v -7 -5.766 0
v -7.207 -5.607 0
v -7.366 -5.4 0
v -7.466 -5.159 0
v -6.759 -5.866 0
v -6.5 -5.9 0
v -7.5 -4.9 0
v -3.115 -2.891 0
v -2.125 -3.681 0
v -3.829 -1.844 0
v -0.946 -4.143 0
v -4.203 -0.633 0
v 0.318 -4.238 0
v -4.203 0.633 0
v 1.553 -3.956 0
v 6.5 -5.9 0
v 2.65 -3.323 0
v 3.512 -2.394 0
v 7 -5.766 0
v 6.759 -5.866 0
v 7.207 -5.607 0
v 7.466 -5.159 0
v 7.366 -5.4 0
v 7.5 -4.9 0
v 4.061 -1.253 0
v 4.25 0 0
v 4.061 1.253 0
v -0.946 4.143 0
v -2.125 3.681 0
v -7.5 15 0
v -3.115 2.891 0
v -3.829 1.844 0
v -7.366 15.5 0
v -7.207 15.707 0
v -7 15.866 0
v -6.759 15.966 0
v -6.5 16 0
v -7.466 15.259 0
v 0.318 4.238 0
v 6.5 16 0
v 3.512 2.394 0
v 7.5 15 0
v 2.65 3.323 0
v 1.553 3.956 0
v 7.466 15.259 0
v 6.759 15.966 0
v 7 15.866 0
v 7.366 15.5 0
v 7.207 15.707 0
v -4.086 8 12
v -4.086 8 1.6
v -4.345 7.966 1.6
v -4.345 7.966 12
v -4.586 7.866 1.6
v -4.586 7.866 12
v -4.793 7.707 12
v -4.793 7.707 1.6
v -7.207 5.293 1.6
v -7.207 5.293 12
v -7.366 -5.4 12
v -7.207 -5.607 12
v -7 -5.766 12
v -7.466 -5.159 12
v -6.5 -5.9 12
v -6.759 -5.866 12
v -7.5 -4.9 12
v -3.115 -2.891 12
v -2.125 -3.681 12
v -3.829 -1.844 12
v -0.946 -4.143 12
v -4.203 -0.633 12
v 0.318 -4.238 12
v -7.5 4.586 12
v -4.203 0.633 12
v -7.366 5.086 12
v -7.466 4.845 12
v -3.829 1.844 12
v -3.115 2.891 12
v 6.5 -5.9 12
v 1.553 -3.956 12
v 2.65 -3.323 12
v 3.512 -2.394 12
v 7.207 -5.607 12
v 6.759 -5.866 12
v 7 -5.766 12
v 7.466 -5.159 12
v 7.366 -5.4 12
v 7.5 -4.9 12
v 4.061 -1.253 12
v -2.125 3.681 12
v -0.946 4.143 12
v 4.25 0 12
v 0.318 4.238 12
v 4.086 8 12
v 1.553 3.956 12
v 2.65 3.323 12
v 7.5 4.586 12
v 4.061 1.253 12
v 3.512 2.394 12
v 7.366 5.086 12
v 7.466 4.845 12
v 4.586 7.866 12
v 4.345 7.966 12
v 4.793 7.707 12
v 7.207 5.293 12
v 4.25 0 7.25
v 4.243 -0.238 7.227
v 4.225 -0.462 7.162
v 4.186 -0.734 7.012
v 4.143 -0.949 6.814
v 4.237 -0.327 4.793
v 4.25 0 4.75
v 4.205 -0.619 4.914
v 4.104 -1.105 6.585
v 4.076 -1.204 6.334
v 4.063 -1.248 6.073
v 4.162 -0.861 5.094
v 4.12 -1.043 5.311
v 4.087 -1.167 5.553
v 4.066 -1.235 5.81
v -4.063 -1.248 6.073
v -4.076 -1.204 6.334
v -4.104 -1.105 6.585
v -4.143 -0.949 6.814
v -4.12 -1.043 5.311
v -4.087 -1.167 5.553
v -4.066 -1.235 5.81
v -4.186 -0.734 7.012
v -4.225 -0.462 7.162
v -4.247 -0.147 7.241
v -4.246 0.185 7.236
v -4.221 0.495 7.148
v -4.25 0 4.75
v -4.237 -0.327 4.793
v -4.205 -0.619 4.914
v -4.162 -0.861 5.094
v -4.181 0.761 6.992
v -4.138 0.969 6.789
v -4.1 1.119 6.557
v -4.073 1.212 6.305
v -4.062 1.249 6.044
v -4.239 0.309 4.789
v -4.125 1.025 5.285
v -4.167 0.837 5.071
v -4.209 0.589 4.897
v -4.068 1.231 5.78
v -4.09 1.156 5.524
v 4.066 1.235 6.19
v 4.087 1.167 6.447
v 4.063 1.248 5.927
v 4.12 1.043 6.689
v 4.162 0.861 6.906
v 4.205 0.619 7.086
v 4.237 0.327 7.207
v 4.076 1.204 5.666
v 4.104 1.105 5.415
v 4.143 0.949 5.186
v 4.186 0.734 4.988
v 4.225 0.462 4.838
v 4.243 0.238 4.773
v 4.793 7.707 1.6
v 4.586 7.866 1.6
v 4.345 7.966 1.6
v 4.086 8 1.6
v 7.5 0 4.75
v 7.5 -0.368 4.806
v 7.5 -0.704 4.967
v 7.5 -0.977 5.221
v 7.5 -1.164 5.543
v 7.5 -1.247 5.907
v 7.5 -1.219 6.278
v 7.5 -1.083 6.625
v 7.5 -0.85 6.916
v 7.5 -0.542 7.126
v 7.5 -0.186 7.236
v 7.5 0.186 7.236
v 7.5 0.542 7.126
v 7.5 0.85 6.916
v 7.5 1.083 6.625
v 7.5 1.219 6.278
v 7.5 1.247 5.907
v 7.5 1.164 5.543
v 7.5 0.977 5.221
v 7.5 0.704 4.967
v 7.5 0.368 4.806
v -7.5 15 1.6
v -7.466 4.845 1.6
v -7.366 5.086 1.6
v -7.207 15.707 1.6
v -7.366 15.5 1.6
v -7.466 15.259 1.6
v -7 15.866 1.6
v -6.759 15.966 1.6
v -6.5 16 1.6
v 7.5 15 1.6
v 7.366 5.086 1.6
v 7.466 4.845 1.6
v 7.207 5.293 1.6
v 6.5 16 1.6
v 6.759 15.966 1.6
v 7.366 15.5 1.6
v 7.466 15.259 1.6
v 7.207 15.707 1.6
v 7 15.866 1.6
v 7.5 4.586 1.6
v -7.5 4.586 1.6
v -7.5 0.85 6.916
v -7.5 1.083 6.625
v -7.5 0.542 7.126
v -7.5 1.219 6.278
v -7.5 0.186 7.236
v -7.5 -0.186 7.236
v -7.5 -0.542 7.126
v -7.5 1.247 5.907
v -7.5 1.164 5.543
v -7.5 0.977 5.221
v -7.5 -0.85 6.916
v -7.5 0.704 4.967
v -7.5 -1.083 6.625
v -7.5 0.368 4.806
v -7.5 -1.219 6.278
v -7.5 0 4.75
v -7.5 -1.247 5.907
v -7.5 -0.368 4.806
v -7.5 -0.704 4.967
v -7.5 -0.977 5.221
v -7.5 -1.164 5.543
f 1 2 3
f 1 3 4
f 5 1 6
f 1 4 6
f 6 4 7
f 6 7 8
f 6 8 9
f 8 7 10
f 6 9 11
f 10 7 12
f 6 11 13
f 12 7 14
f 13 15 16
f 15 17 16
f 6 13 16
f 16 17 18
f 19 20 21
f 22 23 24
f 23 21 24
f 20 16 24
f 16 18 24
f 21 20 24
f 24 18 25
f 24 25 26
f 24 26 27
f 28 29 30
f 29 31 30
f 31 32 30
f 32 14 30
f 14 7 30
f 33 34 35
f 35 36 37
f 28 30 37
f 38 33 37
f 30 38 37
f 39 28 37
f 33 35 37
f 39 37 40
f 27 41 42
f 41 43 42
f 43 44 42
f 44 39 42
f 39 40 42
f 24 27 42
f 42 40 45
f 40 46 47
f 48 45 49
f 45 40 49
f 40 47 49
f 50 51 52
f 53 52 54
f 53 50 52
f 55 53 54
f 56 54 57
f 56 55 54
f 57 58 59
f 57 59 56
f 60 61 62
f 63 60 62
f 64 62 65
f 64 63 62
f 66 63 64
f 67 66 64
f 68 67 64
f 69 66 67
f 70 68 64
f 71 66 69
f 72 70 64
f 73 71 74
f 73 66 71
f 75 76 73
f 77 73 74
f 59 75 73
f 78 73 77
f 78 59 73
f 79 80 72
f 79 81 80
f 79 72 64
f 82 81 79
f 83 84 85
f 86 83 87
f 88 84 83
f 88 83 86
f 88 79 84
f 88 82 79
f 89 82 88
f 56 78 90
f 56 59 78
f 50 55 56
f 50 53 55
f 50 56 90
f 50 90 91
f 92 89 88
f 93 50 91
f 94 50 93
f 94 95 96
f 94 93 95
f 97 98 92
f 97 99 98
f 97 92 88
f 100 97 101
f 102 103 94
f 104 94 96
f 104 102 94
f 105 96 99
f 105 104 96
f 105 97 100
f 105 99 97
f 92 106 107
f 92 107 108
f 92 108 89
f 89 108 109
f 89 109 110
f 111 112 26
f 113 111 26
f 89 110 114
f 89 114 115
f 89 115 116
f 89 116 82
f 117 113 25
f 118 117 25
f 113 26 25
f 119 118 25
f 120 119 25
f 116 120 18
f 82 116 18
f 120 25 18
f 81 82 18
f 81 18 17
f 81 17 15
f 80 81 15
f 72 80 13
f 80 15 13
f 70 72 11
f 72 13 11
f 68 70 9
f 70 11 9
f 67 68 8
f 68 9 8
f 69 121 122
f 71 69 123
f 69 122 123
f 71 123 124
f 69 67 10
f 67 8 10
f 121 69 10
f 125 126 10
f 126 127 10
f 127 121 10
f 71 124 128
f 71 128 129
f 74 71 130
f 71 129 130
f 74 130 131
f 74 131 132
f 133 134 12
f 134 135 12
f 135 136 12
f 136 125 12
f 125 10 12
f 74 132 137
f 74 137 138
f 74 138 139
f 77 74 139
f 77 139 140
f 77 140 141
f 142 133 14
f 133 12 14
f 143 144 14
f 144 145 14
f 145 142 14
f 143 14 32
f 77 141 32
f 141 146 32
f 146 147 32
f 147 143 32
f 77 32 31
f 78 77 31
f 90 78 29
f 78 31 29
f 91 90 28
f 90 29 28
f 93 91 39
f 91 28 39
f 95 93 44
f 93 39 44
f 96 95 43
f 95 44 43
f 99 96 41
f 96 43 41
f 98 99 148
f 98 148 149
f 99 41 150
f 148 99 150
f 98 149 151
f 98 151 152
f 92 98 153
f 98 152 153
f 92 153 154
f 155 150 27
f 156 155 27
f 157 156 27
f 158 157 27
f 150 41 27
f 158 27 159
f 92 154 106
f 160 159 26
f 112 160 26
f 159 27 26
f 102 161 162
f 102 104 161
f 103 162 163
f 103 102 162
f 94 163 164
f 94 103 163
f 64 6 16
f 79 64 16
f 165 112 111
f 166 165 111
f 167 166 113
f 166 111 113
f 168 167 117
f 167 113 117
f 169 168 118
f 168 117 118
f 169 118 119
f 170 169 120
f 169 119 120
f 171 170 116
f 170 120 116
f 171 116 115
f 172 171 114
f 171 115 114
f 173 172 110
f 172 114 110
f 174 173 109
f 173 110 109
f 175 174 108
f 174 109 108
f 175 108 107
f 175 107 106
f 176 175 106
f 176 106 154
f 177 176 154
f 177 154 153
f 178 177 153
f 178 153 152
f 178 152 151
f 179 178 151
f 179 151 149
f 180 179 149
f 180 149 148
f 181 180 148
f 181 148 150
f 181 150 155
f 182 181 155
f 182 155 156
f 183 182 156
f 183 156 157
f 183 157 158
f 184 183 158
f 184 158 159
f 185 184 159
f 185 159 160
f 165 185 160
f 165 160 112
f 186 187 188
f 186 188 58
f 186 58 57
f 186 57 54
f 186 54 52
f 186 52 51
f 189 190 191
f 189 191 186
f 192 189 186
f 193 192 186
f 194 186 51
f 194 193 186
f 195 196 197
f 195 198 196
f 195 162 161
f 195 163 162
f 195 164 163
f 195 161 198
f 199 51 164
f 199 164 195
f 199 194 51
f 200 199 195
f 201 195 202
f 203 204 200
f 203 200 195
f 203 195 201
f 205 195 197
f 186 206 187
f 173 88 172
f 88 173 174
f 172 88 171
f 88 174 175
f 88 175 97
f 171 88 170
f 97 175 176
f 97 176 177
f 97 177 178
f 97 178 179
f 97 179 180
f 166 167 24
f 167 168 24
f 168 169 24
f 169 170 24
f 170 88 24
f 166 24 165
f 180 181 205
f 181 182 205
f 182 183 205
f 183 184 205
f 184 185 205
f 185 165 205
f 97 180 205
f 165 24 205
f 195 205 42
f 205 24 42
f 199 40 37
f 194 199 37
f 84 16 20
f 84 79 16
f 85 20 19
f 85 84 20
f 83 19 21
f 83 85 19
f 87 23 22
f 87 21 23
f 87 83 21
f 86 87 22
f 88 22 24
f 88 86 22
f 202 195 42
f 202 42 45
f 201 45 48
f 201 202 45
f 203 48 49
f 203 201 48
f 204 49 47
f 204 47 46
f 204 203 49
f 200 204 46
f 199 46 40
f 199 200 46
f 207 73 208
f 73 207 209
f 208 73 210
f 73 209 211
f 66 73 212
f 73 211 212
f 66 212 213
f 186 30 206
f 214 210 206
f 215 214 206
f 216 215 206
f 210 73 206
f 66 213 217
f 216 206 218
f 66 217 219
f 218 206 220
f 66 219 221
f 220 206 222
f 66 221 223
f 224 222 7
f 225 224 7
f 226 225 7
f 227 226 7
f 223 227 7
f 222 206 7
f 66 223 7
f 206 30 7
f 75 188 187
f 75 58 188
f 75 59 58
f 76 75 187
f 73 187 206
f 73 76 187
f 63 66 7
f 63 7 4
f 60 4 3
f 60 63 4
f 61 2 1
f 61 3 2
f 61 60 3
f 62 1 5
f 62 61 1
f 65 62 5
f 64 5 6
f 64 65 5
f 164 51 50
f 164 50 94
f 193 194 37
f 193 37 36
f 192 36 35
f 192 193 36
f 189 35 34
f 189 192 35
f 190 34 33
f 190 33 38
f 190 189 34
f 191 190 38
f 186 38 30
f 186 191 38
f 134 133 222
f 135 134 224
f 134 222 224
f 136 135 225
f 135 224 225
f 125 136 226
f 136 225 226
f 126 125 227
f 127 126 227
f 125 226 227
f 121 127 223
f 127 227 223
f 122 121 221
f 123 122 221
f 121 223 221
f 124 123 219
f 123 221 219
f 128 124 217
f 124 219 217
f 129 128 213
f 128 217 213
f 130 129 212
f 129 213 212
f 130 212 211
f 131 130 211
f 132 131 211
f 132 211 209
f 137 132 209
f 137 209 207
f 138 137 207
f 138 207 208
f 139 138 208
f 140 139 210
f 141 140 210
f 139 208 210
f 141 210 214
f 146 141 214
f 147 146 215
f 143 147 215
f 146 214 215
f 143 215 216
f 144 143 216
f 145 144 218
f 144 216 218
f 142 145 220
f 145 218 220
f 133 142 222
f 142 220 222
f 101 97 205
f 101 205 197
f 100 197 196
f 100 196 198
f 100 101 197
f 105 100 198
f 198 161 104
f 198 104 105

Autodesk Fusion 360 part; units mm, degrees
sketch "スケッチ1" plane through (0, 0, 0) normal (0, 0, 1) x (1, 0, 0)
  line L0 (7.5, 16) -> (-7.5, 16)
  line L1 (-7.5, 16) -> (-7.5, -5.9)
  line L2 (-7.5, -5.9) -> (7.5, -5.9)
  line L3 (7.5, -5.9) -> (7.5, 16)
  line L4 (7.5, 16) -> (-7.5, -5.9) construction
  line L5 (-7.5, 16) -> (7.5, -5.9) construction
  circle A0 centre (0, 0) radius 4.25
  line L6 (-7.5, 5) -> (-4.5, 8)
  line L7 (-4.5, 8) -> (4.5, 8)
  line L8 (4.5, 8) -> (7.5, 5)
  point P0 (0, 5.05)
  dimension "d1" = 15
  dimension "d2" = 21.9
  dimension "d3" = 8.5
  dimension "d4" = 5.9
  dimension "d5" = 13.9
  dimension "d6" = 45
  dimension "d7" = 45
  dimension "d8" = 3
  dimension "d9" = 3
extrude "押し出し1" add sketch "スケッチ1" along normal blind 12 contours L1 L2 L3 L6 L7 L8
extrude "押し出し2" add sketch "スケッチ1" along normal blind 1.6 contours L0 L1 L3 L6 L7 L8
hole "穴1" at (7.5, 0, 6) direction (-1, 0, 0) diameter 2.5 depth 16 tip angle 118
fillet "フィレット1" radius 1 8 edges at (-7.5, -5.9, 6) (7.5, -5.9, 6) (7.5, 5, 6.8) (4.5, 8, 6.8) (-4.5, 8, 6.8) (-7.5, 5, 6.8) (-7.5, 16, 0.8) (7.5, 16, 0.8)
